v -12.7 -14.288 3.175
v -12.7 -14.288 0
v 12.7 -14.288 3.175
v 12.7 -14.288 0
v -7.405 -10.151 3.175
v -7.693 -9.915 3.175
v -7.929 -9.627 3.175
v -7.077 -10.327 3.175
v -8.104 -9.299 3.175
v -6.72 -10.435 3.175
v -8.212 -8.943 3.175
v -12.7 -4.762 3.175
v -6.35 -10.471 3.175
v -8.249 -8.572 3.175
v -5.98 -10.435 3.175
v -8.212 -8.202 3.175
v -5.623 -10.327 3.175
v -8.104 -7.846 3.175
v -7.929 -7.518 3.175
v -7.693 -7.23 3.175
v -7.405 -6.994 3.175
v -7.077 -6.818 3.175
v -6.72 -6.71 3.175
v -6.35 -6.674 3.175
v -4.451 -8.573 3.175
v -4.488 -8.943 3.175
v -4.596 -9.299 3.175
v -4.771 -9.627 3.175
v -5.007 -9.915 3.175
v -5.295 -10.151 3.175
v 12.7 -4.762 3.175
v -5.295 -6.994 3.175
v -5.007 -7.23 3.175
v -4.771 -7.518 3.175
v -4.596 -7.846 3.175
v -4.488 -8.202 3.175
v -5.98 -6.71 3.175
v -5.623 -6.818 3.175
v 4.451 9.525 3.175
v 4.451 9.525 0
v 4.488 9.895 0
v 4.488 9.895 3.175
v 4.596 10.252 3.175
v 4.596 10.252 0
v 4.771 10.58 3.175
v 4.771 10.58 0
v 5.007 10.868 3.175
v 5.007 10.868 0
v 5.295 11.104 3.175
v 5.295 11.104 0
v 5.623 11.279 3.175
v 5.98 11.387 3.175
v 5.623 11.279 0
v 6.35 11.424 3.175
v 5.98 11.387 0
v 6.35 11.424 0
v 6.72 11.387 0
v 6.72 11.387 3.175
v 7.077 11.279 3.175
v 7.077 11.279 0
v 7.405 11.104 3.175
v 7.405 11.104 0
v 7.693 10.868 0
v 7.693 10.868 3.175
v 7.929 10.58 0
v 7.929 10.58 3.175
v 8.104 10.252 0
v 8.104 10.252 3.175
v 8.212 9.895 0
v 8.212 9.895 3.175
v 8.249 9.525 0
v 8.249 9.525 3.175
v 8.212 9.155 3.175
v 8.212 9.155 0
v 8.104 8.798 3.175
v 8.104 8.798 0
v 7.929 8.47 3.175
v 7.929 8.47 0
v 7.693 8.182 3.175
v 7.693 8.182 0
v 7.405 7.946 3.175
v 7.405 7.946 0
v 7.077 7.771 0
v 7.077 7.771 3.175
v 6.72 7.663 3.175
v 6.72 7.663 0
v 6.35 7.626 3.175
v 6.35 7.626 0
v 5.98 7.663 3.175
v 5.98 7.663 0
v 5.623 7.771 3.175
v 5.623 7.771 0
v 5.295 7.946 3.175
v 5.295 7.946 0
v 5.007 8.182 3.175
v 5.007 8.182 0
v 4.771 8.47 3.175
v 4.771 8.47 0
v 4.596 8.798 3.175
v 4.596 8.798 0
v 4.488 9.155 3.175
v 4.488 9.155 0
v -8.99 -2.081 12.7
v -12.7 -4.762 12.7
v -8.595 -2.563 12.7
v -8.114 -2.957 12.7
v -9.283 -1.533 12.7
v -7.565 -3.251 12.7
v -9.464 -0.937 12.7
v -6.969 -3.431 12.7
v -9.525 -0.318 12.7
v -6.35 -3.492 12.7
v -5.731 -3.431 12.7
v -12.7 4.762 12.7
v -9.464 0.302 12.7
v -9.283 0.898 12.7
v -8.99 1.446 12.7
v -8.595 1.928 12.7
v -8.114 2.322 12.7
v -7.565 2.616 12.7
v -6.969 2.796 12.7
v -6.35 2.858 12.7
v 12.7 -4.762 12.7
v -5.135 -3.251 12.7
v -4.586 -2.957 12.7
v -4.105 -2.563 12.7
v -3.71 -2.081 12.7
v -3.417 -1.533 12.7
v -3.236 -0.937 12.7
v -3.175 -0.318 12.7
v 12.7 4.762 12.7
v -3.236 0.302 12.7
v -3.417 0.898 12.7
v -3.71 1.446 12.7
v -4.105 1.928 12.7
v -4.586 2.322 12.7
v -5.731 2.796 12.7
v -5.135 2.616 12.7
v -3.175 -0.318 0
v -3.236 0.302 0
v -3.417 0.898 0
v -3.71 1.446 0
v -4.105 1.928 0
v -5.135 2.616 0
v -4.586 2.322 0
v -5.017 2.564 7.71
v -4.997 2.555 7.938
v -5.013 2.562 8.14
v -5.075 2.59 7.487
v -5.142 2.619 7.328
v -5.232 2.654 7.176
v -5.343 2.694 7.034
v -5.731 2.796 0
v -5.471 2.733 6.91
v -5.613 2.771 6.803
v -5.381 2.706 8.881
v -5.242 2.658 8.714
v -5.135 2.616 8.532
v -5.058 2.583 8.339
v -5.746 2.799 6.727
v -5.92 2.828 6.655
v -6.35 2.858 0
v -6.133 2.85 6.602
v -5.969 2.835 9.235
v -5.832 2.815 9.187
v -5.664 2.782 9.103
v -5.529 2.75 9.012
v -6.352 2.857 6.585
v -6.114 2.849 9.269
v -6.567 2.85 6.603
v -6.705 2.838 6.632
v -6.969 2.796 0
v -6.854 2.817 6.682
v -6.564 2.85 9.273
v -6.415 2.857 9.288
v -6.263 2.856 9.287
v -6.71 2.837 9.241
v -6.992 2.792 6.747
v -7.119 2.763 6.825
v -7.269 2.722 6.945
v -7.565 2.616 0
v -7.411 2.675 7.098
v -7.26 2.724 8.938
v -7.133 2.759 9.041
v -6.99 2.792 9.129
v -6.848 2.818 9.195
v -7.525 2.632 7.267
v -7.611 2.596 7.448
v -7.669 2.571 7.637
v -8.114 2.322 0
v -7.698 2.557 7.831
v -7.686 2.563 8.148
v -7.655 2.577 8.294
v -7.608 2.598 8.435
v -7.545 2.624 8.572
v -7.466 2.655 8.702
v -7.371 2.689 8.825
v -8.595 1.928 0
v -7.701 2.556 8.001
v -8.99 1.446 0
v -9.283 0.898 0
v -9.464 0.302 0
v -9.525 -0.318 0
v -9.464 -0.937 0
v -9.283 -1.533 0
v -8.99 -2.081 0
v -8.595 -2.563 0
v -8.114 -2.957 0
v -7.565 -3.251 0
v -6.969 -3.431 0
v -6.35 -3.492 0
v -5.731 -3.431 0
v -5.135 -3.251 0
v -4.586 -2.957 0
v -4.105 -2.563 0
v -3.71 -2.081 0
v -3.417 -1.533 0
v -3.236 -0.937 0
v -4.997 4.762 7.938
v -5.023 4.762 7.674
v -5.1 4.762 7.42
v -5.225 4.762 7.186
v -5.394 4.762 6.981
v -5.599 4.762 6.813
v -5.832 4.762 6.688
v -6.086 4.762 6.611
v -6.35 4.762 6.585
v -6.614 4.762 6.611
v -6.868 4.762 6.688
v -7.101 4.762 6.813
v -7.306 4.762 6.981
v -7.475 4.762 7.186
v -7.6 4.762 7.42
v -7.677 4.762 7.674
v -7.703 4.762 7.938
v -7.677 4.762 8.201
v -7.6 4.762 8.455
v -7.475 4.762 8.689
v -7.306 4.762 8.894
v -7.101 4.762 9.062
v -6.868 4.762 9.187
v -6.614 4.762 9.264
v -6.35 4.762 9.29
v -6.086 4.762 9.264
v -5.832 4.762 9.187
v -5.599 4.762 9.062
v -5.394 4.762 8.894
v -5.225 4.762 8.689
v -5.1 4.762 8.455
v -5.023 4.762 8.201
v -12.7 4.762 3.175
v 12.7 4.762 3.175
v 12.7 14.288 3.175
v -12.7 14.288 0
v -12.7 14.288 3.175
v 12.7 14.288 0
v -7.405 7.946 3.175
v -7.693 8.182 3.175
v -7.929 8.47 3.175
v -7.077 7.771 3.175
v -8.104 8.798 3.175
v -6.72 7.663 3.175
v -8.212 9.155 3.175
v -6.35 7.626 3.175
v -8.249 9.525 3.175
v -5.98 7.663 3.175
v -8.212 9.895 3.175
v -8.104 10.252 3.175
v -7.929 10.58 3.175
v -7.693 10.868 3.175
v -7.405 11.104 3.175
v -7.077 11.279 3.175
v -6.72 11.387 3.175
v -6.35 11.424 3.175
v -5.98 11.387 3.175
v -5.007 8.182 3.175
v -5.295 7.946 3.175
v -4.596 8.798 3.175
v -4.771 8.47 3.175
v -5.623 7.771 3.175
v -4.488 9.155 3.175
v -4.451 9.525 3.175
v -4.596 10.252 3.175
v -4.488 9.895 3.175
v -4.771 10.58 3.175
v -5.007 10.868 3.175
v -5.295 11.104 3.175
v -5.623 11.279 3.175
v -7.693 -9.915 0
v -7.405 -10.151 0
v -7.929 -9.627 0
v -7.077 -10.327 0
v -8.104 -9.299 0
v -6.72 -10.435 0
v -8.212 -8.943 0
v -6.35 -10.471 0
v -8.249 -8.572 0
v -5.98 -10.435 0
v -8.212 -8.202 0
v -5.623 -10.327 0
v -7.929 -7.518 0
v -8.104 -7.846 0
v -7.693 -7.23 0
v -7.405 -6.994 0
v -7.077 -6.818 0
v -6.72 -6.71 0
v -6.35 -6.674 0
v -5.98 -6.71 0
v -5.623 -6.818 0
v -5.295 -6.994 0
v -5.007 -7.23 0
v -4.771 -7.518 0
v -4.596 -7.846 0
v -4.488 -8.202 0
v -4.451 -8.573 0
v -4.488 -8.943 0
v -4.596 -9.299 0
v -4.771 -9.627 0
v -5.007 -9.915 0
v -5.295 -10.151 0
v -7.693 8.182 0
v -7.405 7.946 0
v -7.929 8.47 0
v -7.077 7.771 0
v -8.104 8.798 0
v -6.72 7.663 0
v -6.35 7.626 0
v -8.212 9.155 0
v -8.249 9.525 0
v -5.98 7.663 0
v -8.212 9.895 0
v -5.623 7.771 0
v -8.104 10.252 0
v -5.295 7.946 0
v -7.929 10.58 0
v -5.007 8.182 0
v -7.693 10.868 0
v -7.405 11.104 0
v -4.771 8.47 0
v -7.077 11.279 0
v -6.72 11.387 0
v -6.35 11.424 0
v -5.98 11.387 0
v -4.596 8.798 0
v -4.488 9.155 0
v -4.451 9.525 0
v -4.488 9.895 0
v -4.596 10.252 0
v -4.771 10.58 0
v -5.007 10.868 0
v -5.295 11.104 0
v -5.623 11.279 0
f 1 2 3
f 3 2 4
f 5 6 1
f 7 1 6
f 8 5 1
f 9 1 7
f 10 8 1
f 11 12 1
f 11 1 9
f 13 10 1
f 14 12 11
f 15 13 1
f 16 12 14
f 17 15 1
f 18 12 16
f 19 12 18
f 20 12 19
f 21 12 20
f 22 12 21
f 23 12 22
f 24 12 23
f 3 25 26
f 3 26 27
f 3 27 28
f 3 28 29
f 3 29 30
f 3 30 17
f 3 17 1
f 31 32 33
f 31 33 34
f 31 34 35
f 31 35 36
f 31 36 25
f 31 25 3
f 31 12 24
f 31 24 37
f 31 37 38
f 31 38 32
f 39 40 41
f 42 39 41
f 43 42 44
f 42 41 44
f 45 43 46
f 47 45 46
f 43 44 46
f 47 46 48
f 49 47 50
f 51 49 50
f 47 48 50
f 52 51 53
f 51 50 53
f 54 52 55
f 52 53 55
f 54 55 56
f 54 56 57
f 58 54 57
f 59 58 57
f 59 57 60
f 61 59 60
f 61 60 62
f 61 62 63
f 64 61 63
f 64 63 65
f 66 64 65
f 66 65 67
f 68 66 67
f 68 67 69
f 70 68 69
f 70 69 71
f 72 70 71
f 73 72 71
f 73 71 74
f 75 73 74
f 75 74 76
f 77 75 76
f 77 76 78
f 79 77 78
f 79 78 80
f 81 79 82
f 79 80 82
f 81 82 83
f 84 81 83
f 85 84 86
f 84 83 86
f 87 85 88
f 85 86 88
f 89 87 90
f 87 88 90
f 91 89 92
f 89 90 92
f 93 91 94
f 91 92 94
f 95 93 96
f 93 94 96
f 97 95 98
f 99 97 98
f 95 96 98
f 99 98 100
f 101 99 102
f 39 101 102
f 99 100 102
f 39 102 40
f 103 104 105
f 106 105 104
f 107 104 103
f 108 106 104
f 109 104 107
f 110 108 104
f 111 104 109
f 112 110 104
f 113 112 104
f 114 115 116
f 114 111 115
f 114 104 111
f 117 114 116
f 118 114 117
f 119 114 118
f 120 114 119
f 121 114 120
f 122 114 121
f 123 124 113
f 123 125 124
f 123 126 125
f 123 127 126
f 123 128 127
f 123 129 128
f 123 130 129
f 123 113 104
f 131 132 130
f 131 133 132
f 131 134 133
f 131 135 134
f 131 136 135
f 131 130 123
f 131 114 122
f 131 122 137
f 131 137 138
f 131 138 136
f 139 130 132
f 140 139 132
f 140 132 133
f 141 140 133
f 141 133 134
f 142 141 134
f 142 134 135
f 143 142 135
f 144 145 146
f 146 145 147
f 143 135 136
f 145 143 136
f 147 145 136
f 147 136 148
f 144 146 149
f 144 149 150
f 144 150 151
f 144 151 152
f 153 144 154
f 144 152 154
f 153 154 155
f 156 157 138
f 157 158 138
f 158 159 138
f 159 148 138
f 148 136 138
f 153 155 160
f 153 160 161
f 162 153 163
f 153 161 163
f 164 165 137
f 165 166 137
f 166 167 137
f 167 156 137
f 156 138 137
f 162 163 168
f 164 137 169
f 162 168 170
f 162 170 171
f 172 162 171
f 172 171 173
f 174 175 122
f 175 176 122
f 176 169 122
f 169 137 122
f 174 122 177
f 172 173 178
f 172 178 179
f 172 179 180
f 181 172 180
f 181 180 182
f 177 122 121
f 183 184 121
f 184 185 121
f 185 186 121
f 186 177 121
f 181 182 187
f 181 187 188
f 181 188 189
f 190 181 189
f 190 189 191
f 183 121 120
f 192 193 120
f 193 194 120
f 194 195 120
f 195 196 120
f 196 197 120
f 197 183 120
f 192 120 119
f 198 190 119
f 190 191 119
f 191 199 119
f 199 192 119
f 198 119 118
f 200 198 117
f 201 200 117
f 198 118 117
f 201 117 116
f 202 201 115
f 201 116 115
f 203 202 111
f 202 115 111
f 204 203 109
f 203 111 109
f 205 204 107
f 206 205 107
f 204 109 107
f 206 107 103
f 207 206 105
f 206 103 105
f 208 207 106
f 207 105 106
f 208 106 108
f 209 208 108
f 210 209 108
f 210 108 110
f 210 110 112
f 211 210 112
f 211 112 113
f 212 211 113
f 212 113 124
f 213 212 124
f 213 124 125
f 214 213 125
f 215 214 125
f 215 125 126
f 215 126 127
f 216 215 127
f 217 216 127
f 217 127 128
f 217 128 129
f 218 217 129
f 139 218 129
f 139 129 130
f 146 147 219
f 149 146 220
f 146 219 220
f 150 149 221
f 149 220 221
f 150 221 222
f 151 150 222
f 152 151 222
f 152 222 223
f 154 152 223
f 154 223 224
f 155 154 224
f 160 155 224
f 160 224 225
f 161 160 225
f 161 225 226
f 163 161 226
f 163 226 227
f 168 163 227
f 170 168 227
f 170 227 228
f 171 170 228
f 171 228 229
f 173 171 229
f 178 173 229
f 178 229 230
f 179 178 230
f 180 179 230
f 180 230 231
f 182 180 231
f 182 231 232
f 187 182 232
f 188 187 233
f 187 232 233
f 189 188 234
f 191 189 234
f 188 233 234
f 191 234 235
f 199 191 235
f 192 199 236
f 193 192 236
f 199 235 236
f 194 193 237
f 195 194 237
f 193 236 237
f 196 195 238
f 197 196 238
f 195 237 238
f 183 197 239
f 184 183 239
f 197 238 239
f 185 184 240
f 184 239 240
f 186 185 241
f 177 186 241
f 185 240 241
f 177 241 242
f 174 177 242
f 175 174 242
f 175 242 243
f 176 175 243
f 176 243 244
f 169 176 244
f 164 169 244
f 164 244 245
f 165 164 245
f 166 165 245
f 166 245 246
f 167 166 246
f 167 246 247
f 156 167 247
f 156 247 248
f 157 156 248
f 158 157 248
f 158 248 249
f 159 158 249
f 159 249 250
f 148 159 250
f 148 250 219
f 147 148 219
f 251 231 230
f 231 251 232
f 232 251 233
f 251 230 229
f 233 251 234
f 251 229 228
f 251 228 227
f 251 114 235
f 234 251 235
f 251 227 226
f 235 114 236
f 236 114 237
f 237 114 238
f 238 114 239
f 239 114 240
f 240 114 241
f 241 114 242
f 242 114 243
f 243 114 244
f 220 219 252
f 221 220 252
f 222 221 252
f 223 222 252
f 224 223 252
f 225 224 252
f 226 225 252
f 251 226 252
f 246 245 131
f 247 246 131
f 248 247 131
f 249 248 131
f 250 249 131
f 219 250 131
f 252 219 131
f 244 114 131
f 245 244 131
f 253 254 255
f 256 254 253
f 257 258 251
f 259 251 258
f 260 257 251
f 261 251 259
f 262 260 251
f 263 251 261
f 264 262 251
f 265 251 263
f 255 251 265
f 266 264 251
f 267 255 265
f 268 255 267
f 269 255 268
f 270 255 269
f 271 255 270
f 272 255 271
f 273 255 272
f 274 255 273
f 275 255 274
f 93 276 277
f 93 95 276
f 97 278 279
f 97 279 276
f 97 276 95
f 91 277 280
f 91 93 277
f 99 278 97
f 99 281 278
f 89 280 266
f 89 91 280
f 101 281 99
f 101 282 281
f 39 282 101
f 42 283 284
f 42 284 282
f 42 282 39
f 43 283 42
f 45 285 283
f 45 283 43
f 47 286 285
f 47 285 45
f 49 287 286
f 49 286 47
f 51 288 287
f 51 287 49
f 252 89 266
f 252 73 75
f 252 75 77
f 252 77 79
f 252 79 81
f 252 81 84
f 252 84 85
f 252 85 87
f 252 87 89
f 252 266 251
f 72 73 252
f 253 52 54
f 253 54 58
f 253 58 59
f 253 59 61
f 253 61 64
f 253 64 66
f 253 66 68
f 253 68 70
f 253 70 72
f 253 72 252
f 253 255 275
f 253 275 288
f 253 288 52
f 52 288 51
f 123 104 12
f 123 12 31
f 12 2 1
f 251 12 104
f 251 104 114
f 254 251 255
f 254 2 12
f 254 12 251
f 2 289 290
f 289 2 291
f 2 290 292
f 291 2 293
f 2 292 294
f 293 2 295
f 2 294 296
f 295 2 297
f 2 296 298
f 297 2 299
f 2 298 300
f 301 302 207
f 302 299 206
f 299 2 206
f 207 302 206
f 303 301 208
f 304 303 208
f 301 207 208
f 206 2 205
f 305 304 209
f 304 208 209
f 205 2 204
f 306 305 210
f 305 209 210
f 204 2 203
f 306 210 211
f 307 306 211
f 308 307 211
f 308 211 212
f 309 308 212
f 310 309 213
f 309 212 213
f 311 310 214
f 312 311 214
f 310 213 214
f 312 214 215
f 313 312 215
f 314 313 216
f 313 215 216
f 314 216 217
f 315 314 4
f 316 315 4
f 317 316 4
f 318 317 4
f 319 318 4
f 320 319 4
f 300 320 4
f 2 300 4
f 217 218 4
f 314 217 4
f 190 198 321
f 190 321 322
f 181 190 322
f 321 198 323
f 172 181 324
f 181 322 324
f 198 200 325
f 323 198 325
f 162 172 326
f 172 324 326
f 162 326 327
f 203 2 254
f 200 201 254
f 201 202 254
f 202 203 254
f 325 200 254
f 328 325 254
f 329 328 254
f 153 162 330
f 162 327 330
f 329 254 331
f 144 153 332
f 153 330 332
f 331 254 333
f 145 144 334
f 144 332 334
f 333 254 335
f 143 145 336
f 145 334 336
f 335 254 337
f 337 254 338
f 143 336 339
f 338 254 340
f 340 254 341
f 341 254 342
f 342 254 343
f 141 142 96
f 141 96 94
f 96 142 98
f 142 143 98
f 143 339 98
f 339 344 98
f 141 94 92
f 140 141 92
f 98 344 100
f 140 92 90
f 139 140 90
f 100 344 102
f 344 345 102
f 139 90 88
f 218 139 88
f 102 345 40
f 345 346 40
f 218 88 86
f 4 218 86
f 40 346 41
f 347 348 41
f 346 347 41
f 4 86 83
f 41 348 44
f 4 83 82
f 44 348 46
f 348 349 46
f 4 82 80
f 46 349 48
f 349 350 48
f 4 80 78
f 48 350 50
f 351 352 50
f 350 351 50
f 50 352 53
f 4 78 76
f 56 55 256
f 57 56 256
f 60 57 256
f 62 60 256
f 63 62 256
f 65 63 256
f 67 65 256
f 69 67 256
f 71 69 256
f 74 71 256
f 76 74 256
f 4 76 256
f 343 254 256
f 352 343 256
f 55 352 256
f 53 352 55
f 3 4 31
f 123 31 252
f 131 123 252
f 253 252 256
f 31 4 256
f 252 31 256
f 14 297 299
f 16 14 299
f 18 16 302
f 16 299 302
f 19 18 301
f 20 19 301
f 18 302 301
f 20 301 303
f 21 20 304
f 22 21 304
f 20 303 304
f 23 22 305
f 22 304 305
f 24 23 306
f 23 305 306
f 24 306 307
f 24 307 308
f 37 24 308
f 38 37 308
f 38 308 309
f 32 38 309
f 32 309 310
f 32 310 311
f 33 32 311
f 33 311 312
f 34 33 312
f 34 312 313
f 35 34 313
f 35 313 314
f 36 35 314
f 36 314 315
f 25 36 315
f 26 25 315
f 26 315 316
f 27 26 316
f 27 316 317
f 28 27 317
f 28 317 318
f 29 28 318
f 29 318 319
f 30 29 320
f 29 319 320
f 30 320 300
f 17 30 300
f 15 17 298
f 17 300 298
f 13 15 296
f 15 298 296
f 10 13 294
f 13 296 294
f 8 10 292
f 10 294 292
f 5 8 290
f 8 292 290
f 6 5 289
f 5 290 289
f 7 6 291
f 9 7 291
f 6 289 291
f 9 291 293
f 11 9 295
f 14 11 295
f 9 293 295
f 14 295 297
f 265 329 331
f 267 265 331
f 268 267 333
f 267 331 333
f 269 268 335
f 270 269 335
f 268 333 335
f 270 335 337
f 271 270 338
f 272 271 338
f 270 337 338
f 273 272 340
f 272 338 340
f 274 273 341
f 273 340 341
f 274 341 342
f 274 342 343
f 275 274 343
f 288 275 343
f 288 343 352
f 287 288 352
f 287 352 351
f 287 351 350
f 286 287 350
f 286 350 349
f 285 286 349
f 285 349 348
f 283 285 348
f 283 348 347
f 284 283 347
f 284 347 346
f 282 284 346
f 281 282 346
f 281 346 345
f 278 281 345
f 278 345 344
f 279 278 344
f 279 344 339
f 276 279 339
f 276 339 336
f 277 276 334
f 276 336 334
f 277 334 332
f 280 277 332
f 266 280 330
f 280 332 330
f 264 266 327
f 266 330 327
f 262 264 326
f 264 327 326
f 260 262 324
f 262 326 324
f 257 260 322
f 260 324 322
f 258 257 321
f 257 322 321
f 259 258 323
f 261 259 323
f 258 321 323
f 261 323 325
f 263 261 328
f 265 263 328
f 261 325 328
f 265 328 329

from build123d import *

# Parameters (mm, degrees)
SKETCH1_W                  = 25.4
SKETCH1_H                  = 28.575
BOSS_EXTRUDE1_DEPTH        = 12.7
SKETCH3_W                  = 25.4
SKETCH3_H                  = 9.525
CUT_EXTRUDE1_DEPTH         = 9.525
SKETCH2_R                  = 3.175
CUT_EXTRUDE2_DEPTH         = 23.950221268
F_6_32_TAPPED_HOLE1_REACH  = 28.182
F_6_32_TAPPED_HOLE1_BORE_R = 1.35255
F_6_CLEARANCE_HOLE1_D      = 3.7973


with BuildPart() as part:
    # Sketch1 → Boss-Extrude1 (new body)
    with BuildSketch(Plane.XY):
        Rectangle(SKETCH1_W, SKETCH1_H)
    extrude(amount=BOSS_EXTRUDE1_DEPTH)

    # Sketch3 → Cut-Extrude1 (cut)
    with BuildSketch(Plane.XY.offset(12.7)):
        with Locations((0, -9.525)):
            Rectangle(SKETCH3_W, SKETCH3_H)
        with Locations((0, 9.525)):
            Rectangle(SKETCH3_W, SKETCH3_H)
    extrude(amount=-CUT_EXTRUDE1_DEPTH, mode=Mode.SUBTRACT)

    # Sketch2 → Cut-Extrude2 (cut, through all)
    with BuildSketch(Plane.XY.offset(12.7)):
        with Locations((-6.35, -0.3175)):
            Circle(SKETCH2_R)
    extrude(amount=-CUT_EXTRUDE2_DEPTH, mode=Mode.SUBTRACT)

    # #6-32 Tapped Hole1 bore → #6-32 Tapped Hole1 (cut, up to next)
    with BuildSketch(Plane(origin=(0, 4.7625, 0), x_dir=(1, 0, 0), z_dir=(0, 1, 0)), mode=Mode.PRIVATE) as f_6_32_tapped_hole1_sk1:
        with Locations((-6.35, -7.9375)):
            Circle(F_6_32_TAPPED_HOLE1_BORE_R)
    f_6_32_tapped_hole1_tool1 = extrude(f_6_32_tapped_hole1_sk1.sketch, amount=-F_6_32_TAPPED_HOLE1_REACH, mode=Mode.PRIVATE) & part.part
    add(f_6_32_tapped_hole1_tool1.solids().sort_by_distance((-6.35, 4.7625, 7.9375))[0], mode=Mode.SUBTRACT)

    # #6 Clearance Hole1 (through all)
    with Locations(Plane.XY.offset(3.175)):
        with Locations((-6.35, 9.525), (6.35, 9.525), (-6.35, -8.5725)):
            Hole(F_6_CLEARANCE_HOLE1_D / 2)


solid = part.part
